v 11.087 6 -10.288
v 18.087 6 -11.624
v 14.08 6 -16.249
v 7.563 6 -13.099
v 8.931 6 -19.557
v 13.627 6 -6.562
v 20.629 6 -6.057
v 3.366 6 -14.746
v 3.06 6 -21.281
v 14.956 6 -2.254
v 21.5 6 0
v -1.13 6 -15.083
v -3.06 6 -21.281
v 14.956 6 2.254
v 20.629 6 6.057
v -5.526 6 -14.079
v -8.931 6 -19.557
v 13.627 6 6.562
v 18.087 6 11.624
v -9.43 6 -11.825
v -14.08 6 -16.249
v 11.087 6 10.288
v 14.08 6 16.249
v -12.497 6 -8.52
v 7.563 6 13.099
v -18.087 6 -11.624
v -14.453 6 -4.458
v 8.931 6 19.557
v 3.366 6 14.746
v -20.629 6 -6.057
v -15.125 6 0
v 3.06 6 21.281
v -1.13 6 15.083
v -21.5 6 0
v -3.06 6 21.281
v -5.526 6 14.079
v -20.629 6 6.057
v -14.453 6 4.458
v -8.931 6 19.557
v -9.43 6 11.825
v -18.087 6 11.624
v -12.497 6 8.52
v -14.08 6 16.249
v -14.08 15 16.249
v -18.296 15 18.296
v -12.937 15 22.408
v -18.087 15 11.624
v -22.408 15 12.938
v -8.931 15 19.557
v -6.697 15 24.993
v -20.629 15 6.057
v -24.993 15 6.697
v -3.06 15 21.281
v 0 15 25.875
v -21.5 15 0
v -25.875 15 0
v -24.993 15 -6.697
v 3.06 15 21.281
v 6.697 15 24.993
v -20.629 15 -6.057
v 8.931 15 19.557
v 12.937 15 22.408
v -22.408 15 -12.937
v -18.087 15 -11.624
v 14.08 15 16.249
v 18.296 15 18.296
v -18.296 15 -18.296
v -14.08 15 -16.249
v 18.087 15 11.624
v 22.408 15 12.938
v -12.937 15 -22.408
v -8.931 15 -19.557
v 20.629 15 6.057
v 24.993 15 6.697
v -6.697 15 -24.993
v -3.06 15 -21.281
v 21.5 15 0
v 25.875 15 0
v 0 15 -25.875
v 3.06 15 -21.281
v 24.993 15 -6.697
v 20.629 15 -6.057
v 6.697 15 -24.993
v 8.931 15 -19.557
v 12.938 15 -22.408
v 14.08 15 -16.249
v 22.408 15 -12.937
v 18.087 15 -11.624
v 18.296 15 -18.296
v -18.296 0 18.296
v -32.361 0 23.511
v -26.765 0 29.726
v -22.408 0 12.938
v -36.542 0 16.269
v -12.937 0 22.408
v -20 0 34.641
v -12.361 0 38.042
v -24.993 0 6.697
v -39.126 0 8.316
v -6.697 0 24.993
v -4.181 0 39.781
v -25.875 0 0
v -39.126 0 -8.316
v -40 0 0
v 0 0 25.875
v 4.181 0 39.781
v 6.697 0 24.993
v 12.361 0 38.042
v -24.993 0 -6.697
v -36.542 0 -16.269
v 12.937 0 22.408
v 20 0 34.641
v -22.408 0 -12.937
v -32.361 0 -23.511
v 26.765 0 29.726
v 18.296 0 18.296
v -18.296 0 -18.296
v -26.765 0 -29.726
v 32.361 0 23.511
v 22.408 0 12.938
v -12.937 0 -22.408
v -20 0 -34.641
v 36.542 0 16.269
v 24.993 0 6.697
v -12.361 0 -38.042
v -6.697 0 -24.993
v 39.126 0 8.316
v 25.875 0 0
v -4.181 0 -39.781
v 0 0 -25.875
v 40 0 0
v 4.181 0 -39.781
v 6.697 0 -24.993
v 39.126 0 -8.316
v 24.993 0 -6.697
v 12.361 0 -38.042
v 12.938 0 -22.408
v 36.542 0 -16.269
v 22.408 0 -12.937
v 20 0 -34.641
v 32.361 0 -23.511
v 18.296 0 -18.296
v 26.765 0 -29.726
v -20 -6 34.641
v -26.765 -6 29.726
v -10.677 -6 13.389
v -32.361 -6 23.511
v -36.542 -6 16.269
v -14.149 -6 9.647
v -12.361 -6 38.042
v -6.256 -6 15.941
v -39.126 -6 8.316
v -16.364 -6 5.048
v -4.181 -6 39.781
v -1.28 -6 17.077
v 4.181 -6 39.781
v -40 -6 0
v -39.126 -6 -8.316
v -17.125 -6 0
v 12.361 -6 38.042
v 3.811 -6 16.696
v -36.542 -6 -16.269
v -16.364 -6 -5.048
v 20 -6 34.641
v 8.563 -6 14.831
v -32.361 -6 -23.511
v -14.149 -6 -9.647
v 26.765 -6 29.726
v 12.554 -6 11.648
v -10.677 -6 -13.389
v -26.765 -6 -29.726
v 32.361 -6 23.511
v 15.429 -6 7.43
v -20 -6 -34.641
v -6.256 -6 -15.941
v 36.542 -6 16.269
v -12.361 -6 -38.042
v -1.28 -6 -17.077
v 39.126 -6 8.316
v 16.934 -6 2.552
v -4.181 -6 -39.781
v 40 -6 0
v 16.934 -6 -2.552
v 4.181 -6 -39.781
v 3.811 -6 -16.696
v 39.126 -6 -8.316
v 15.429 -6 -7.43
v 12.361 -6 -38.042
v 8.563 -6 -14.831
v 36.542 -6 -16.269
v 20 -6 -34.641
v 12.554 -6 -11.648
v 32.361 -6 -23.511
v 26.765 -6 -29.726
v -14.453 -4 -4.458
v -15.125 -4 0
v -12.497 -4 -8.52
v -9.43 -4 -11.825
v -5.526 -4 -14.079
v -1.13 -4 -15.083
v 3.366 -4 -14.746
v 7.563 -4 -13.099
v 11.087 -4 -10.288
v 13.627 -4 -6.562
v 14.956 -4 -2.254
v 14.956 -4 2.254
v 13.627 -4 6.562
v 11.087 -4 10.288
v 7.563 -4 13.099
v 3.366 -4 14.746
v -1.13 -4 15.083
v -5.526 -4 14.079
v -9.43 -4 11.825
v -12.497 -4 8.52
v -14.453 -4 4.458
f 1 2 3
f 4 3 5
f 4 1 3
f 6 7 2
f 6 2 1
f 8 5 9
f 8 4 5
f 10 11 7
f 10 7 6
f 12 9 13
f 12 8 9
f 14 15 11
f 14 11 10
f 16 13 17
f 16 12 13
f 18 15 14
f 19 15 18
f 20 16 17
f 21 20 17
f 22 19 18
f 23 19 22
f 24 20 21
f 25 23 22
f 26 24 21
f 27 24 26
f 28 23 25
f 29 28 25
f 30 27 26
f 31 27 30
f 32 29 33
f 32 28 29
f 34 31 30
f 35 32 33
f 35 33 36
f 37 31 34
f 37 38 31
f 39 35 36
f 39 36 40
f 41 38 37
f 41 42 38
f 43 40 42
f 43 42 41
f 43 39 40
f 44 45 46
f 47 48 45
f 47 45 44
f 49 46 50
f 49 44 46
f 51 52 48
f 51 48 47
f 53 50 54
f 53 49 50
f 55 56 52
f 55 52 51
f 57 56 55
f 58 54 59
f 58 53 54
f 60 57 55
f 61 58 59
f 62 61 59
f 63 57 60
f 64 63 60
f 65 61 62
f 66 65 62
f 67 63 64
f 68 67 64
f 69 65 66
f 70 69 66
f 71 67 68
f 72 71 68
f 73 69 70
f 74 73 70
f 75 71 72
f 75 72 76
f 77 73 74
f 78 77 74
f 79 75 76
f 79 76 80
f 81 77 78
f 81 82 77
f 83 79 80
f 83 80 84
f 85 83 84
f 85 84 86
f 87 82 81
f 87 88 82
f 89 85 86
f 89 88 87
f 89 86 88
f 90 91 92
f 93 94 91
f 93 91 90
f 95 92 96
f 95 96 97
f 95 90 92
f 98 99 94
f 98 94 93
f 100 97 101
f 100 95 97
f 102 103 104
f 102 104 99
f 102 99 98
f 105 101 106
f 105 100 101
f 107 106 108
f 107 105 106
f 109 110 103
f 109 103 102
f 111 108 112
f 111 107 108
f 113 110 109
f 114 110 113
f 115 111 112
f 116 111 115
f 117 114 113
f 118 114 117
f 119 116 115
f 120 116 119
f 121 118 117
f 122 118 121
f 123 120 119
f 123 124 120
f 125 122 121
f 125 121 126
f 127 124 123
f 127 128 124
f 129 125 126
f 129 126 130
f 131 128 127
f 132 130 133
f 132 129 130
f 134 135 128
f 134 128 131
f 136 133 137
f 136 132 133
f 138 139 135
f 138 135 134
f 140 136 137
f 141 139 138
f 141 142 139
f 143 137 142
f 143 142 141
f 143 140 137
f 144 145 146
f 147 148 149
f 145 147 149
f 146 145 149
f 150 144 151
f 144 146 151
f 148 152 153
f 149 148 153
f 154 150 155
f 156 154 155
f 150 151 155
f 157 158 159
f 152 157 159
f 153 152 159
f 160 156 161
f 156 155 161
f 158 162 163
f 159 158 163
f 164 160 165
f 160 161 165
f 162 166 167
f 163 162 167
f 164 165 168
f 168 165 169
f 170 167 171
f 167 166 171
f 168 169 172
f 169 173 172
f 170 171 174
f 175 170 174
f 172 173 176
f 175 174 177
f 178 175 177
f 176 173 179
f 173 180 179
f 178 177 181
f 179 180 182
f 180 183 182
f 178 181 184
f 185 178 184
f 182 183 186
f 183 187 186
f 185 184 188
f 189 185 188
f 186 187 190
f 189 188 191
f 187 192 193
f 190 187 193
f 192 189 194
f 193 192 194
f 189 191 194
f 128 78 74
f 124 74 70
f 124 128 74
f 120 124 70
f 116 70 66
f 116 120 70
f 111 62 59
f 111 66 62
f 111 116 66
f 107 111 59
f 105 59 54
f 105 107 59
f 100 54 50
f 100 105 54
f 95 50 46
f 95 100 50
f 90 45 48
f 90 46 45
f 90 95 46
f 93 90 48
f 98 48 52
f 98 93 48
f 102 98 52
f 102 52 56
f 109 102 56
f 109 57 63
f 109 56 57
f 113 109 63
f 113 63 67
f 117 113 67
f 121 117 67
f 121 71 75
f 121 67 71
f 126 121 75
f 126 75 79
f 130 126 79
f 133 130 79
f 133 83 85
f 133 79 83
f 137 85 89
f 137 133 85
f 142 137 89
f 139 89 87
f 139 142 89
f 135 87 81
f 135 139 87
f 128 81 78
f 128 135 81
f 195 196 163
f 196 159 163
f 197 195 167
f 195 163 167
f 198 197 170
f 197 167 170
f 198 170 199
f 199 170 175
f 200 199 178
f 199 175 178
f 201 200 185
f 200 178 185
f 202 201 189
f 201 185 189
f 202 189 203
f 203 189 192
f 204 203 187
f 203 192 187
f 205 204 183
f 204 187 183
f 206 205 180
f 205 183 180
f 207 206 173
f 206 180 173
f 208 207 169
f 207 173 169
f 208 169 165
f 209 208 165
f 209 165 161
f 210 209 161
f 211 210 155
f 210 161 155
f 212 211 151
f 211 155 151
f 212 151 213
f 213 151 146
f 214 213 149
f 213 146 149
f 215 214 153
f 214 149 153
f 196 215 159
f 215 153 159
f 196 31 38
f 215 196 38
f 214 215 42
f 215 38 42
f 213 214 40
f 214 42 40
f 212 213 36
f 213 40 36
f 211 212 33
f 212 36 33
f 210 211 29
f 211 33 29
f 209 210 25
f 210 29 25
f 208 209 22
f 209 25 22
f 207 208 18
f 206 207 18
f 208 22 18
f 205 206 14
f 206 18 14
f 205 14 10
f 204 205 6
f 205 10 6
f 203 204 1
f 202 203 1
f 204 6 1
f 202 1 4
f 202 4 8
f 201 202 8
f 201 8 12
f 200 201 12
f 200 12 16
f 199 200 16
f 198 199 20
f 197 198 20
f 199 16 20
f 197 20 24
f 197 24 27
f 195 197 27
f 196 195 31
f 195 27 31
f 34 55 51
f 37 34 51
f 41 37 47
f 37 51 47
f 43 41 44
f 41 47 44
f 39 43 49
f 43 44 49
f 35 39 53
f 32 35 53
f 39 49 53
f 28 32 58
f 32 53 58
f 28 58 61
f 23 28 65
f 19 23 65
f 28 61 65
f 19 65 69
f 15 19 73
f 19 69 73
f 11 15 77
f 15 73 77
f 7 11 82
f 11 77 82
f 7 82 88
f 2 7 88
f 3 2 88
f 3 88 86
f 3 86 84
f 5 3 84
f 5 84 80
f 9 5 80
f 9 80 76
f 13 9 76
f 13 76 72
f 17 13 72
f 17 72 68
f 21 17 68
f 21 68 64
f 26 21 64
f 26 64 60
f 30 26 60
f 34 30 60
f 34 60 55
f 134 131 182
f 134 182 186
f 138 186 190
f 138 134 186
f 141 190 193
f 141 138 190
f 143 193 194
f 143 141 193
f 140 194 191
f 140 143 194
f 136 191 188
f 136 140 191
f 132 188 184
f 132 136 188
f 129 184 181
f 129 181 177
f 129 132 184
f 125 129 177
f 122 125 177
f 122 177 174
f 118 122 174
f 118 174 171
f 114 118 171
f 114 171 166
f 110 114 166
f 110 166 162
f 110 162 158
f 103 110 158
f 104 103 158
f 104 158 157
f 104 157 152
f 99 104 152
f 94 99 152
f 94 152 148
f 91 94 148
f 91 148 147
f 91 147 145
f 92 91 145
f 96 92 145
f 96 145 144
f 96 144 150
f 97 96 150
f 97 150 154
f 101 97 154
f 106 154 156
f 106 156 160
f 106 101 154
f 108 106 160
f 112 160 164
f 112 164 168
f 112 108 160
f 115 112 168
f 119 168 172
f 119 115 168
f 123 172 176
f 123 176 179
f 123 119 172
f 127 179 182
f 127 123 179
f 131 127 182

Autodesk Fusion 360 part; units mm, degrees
sketch "Sketch1" plane through (0, 0, 0) normal (0, 1, 0) x (1, 0, 0)
  circle A0 centre (0, 0) radius 25.875
  circle A1 centre (0, 0) radius 40
  dimension "d1" = 51.75
  dimension "d2" = 80
extrude "Extrude1" add sketch "Sketch1" along normal blind 15 contours A0
extrude "Extrude2" add sketch "Sketch1" against normal blind 6 contours A0 | A1
sketch "Sketch2" plane through (0, 15, 0) normal (0, 1, 0) x (-1, 0, 0)
  circle A0 centre (0, 0) radius 25.875
  circle A1 centre (0, 0) radius 15.125
  dimension "d7" = 30.25
extrude "Extrude3" cut sketch "Sketch2" against normal blind 77.834 contours A1
sketch "Sketch3" plane through (0, 15, 0) normal (0, 1, 0) x (-1, 0, 0)
  circle A0 centre (0, 0) radius 15.125
  circle A1 centre (0, 0) radius 25.875
  circle A2 centre (0, 0) radius 21.5
  dimension "d10" = 43
extrude "Extrude4" cut sketch "Sketch3" against normal blind 9 contours A2
chamfer "Chamfer1" distance 2 angle 45 1 edges at (14.1015, -6, -5.4694)
